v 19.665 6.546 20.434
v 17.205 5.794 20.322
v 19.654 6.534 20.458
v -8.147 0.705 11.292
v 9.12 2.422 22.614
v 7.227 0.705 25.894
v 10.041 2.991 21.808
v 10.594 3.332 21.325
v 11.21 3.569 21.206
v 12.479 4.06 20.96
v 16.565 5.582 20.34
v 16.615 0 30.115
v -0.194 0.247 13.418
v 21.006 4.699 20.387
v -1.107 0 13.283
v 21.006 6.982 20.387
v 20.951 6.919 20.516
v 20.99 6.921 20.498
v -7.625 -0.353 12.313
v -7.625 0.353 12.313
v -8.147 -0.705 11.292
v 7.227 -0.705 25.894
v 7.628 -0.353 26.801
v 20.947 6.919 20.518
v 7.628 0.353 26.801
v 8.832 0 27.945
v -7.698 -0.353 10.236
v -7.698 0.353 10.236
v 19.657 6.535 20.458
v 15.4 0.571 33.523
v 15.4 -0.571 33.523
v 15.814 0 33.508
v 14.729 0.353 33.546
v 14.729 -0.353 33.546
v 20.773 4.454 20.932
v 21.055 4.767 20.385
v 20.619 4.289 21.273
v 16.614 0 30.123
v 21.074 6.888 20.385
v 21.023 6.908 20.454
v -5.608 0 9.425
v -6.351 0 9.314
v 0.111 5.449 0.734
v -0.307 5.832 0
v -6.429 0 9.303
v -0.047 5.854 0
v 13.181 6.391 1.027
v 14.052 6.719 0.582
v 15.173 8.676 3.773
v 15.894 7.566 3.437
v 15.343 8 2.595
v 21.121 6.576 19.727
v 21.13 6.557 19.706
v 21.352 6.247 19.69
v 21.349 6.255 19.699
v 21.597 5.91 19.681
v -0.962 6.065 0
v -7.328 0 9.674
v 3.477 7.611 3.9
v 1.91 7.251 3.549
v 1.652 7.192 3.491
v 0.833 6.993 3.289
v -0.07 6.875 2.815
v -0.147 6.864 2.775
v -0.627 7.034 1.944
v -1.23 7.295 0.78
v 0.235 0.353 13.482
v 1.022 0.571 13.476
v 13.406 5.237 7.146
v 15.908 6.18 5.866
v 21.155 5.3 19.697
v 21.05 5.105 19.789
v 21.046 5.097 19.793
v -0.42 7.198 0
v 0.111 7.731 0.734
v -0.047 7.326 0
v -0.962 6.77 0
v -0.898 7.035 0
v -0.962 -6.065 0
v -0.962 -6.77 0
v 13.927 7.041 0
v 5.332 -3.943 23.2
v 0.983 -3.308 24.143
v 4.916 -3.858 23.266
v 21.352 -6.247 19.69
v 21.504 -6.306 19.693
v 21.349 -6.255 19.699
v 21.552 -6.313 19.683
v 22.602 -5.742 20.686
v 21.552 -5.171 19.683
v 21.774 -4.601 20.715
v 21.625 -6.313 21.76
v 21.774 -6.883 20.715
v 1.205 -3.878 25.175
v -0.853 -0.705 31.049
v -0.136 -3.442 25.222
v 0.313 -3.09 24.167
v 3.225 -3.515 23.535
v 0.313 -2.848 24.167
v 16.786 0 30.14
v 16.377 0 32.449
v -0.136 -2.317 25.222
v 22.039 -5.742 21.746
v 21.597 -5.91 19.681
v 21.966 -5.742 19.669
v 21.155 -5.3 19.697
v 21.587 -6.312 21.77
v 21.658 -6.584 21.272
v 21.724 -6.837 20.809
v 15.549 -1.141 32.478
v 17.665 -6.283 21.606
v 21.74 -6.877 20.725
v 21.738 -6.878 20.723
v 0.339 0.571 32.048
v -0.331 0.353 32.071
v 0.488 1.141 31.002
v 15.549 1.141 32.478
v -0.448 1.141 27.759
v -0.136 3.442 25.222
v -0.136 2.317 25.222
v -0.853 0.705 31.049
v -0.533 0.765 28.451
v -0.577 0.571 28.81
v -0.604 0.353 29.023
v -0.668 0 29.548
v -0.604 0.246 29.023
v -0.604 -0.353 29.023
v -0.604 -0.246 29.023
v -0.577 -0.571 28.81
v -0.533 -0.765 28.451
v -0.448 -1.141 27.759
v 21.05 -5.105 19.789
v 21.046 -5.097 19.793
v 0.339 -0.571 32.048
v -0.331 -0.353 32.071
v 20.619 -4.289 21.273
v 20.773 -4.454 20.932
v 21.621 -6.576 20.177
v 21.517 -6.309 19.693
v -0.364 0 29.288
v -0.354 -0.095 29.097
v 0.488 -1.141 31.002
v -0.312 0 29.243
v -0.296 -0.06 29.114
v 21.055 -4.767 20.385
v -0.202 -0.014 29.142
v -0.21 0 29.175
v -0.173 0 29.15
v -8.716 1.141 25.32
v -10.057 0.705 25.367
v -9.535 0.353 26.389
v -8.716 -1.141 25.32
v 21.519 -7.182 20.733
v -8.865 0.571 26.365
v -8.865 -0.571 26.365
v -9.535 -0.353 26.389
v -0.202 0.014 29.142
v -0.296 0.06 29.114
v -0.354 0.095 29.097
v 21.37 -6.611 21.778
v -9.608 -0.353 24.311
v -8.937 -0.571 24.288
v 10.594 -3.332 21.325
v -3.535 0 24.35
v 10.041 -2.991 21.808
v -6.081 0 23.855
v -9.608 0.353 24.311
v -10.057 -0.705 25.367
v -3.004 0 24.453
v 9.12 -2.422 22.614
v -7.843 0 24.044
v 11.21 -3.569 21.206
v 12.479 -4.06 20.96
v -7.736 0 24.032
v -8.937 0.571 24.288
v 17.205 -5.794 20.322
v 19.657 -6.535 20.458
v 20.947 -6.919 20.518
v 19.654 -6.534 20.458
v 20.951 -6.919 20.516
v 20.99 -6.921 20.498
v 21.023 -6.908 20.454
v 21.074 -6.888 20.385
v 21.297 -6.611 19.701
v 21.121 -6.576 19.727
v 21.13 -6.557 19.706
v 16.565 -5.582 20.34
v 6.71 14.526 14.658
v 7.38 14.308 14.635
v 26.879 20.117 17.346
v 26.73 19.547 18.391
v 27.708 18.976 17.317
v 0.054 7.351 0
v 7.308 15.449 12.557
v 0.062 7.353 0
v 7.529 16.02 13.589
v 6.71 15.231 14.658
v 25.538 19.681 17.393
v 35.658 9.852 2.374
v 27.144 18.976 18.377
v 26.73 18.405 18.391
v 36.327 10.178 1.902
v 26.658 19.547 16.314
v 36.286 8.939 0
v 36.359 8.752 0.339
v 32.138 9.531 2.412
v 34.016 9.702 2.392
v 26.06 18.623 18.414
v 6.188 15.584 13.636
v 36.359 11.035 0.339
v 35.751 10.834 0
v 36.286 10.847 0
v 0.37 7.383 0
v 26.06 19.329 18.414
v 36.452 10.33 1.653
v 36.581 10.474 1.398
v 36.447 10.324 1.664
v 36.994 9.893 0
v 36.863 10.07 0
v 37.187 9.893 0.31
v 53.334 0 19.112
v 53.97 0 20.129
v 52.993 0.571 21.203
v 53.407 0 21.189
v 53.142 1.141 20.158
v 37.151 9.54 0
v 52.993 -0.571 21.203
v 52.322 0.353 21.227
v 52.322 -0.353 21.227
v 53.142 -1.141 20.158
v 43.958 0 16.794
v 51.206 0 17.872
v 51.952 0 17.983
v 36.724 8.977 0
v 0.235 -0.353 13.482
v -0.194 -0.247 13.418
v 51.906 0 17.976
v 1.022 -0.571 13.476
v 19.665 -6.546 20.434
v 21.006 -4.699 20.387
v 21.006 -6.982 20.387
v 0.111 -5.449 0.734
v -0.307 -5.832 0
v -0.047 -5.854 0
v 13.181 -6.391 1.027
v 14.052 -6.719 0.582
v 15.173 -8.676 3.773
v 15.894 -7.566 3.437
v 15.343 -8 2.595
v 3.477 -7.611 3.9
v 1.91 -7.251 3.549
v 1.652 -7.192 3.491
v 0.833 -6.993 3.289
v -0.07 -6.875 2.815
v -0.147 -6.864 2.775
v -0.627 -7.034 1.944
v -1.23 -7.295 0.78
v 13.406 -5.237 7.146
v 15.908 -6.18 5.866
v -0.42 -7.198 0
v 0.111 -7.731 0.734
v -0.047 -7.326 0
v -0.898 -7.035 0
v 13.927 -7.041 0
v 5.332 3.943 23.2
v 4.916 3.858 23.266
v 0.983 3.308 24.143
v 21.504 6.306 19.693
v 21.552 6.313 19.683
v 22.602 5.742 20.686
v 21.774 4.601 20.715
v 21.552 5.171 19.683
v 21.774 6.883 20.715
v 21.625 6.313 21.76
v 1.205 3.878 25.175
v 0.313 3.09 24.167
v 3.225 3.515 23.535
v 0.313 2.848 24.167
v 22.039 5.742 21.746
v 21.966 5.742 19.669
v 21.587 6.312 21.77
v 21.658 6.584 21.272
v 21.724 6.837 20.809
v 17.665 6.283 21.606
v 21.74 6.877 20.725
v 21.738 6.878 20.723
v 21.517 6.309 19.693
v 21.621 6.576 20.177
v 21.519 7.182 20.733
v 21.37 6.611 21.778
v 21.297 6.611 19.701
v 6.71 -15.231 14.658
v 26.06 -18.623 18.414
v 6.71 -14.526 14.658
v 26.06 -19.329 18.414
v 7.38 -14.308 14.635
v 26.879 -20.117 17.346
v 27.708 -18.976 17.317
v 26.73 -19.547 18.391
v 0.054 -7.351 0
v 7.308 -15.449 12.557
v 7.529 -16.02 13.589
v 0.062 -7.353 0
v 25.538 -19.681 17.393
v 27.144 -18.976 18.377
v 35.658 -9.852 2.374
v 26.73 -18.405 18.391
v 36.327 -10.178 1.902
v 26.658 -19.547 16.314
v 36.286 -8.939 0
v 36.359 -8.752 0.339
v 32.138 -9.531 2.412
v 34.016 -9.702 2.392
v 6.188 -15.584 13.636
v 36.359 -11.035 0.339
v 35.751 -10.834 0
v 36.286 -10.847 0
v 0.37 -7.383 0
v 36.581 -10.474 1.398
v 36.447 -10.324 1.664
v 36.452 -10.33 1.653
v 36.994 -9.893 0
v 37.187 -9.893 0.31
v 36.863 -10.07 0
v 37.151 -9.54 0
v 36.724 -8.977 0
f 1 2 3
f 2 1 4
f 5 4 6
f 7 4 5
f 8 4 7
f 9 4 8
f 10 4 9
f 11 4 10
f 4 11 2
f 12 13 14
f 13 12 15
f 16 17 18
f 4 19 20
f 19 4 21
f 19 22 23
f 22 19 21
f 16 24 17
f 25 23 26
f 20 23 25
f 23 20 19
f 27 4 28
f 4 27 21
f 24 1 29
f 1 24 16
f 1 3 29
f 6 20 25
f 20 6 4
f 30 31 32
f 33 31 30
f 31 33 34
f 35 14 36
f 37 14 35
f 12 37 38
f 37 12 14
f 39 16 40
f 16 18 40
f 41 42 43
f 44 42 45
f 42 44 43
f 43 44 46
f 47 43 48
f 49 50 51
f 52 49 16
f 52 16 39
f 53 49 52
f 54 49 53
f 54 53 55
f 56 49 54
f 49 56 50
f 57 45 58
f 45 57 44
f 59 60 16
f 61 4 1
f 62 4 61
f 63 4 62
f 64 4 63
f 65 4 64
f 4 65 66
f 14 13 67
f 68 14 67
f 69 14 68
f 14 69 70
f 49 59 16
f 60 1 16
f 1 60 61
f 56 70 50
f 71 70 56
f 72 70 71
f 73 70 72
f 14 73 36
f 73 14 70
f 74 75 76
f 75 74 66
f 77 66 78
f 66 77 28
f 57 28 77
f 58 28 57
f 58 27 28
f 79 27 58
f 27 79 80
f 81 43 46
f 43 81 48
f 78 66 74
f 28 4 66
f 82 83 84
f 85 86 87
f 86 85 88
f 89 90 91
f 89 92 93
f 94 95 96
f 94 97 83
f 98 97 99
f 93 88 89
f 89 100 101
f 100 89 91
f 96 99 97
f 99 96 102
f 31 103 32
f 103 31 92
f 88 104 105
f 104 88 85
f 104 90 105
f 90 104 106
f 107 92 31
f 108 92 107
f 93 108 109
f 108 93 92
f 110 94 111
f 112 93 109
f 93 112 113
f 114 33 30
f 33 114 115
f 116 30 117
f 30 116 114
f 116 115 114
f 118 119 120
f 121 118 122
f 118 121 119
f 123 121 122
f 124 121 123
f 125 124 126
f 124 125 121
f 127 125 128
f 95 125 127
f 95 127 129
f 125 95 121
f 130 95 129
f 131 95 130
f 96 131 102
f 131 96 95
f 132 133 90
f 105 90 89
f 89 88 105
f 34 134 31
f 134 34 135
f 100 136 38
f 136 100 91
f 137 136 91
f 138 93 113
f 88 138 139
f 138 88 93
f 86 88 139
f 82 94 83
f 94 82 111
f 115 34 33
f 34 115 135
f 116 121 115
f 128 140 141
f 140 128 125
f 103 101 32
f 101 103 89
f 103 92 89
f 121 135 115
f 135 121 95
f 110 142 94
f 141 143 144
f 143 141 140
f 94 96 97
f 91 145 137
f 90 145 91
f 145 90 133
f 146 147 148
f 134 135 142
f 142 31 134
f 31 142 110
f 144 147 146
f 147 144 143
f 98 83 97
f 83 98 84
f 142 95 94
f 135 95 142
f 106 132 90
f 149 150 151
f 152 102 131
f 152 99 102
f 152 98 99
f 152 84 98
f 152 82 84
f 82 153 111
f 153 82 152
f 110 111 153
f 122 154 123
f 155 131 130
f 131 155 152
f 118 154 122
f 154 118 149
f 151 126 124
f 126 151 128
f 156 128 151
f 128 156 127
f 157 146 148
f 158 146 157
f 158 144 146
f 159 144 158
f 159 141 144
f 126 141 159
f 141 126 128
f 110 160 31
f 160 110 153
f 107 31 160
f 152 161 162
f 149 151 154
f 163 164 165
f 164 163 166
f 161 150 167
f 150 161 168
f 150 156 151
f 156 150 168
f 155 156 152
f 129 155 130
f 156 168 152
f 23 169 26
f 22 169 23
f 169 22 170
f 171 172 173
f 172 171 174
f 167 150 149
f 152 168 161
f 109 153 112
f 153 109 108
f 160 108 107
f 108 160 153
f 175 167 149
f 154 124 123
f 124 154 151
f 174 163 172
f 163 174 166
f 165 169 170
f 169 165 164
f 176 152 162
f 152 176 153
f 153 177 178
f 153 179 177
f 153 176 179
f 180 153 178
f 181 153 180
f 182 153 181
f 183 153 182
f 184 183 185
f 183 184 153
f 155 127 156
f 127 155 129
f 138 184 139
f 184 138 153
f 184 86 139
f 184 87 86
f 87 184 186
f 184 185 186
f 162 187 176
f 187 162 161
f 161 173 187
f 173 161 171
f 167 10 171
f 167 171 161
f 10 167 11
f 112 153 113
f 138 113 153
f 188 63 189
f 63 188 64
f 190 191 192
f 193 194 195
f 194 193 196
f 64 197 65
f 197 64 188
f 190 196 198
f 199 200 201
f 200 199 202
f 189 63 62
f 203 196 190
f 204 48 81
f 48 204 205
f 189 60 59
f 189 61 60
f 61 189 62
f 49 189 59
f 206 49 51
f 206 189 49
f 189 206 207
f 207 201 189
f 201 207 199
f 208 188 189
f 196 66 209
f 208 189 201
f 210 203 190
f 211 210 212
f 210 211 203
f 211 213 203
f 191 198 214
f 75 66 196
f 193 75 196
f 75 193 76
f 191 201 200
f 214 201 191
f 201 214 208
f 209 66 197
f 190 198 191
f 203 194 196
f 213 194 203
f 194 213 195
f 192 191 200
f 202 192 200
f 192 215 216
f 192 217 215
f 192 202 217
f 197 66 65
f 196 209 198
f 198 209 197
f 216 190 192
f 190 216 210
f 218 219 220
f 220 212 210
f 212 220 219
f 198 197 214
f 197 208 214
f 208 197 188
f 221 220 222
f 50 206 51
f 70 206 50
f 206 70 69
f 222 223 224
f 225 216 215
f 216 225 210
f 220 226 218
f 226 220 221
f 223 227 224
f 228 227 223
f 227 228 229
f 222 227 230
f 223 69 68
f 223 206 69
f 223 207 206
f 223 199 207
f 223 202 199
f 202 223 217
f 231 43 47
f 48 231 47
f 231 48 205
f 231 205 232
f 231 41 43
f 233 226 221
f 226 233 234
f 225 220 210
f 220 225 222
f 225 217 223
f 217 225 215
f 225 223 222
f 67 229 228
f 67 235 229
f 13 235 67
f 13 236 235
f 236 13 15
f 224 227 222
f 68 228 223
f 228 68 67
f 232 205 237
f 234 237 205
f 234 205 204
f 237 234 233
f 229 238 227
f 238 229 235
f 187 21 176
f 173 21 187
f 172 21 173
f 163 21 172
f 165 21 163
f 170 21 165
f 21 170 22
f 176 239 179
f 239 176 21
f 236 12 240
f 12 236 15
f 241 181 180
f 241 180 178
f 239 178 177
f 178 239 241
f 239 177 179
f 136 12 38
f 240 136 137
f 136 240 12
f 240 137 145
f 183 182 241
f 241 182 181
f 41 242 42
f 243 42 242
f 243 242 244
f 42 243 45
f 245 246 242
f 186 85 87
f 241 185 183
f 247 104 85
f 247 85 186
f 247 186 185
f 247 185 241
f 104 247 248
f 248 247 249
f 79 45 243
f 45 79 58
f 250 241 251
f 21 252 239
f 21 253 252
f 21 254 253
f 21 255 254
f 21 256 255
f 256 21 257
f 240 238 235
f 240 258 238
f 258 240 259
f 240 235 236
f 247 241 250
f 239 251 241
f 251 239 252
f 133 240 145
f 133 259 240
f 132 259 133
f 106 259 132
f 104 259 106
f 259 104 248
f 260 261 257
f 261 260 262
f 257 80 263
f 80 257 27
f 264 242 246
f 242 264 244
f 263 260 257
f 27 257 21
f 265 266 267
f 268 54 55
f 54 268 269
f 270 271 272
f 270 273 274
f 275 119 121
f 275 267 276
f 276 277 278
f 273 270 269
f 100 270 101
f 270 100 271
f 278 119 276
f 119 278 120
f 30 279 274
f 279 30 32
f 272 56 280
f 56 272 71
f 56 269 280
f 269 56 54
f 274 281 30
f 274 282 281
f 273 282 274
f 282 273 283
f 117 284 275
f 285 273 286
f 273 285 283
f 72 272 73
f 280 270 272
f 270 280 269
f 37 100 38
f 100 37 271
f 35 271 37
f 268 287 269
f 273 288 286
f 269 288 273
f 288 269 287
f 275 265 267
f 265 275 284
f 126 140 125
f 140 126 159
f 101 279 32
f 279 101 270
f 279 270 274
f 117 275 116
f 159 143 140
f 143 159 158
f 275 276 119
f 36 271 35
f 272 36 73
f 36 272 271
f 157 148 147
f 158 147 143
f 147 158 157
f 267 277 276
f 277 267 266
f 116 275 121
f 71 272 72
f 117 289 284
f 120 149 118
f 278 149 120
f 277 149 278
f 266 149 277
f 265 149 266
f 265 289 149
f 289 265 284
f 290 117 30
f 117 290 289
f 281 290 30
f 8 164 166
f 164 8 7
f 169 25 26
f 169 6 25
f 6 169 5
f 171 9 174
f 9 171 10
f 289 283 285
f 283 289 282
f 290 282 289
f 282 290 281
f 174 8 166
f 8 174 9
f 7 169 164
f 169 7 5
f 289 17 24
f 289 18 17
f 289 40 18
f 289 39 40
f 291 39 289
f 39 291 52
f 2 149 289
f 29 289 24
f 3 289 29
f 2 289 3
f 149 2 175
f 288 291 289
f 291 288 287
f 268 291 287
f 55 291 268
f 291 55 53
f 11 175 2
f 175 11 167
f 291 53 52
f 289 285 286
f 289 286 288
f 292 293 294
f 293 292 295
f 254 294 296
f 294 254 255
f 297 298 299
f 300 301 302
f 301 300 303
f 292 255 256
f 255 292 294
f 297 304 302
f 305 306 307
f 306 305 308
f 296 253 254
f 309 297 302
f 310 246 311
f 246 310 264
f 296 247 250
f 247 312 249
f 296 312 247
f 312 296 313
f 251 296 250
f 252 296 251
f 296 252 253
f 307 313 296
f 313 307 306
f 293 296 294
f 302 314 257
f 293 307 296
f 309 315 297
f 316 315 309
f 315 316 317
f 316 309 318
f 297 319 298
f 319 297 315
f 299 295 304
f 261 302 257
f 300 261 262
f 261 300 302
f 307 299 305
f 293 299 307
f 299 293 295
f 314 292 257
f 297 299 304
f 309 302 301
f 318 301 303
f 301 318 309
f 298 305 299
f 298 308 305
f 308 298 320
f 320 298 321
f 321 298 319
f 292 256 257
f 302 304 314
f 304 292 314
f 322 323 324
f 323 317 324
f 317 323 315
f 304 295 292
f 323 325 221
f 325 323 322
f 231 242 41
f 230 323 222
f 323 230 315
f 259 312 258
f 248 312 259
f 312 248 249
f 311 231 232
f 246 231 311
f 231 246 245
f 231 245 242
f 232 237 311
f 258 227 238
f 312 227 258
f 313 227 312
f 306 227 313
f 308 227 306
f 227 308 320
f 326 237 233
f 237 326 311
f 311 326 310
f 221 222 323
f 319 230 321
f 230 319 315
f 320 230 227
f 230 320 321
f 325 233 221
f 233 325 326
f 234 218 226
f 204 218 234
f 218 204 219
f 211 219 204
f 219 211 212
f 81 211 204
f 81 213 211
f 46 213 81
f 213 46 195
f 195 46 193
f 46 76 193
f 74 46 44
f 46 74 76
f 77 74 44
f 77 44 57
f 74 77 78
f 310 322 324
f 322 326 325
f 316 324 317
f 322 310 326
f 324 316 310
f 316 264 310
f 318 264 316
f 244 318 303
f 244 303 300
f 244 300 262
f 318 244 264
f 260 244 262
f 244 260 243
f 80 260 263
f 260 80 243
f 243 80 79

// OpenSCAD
/*
   Origami Duck
   kit wallace

*/
//thickness of 'paper'
thickness=1.2;

body_angle=30;
wing_angle=60;
head_angle=25;

//quality of curves
steps=5;
scale=2;

//  functions for creating the matrices for transforming a single point

function m_translate(v) = [ [1, 0, 0, 0],
                            [0, 1, 0, 0],
                            [0, 0, 1, 0],
                            [v.x, v.y, v.z, 1  ] ];

function m_scale(v) =    [ [v.x, 0, 0, 0],
                            [0, v.y, 0, 0],
                            [0, 0, v.z, 0],
                            [0, 0, 0, 1  ] ];
                            
                            
function m_rotate(v) =  [ [1,  0,         0,        0],
                          [0,  cos(v.x),  sin(v.x), 0],
                          [0, -sin(v.x),  cos(v.x), 0],
                          [0,  0,         0,        1] ]
                      * [ [ cos(v.y), 0,  -sin(v.y), 0],
                          [0,         1,  0,        0],
                          [ sin(v.y), 0,  cos(v.y), 0],
                          [0,         0,  0,        1] ]
                      * [ [ cos(v.z),  sin(v.z), 0, 0],
                          [-sin(v.z),  cos(v.z), 0, 0],
                          [ 0,         0,        1, 0],
                          [ 0,         0,        0, 1] ];
                            
function m_to(centre,normal) = 
      m_rotate([0, atan2(sqrt(pow(normal.x, 2) + pow(normal.y, 2)), normal.z), 0]) 
    * m_rotate([0, 0, atan2(normal.y, normal.x)]) 
    * m_translate(centre);   
   
function m_from(centre,normal) = 
      m_translate(-centre)
    * m_rotate([0, 0, -atan2(normal.y, normal.x)]) 
    * m_rotate([0, -atan2(sqrt(pow(normal.x, 2) + pow(normal.y, 2)), normal.z), 0]); 

function m_rotate_about_line(a,v1,v2) =
      m_from(v1,v2-v1)*m_rotate([0,0,a])*m_to(v1,v2-v1);

function vec3(v) = [v.x, v.y, v.z];
function m_transform(v, m)  = vec3([v.x, v.y, v.z, 1] * m);
 
function face_transform(face,m) =
     [ for (v = face) m_transform(v,m) ];
            
module double(axis) { 
      union() {
          children();
          mirror(axis) children();
      }
  }
module face(s,t=thickness) {
    hull()
    for (i=[0:len(s) -1])
       translate(s[i]) sphere(t/2);     
    } 

module ground(size=50) {
   translate([0,0,-size]) cube(2*size,center=true);
}

  
// vertices
p1=[0,0,0];
p2=[4,0,7.5];
p3=[13.8,0,9.8];
p4=[18.2,0,0];
p5=[26,0,11.5];
p6=[7,0,17];
p7=[10.4,0,10.6];
p8=[7,0,0];
p9=[-5,0,13];
p10=[0,0,12.8];
p11=[-0.5,0,16];
p12=[-3.8,0,6];

$fn=steps;
// faces
body =[p12,p5,p1,p4];
wing=[p1,p2,p3,p4];
neck=[p1,p12,p6,p7,p8];
head=[p7,p6,p11,p10];
beak=[p9,p6,p7];

mbody= m_rotate_about_line(body_angle,p12,p5);
rbody= face_transform(body,mbody);
rwing=face_transform(wing,mbody) ; 
mwing = m_rotate_about_line(-wing_angle,rwing[0],rwing[3]);
rrwing = face_transform(rwing,mwing);

mneck = m_rotate_about_line(head_angle,p12,p6);
rp7= m_transform(p7,mneck);  // has to have a kink

mhead = m_rotate_about_line(head_angle,p6,p11);
rhead=face_transform(head,mhead);
mbeak = m_rotate_about_line(head_angle,p6,p9);
rbeak=face_transform(beak,mbeak);

scale(scale)
difference() {
translate([0,0,-0.5])  // to form a better base
rotate([0,2,0])   // in attempt to get it level - gludgy
  double([0,1,0]) {
    color("blue")
        face(rrwing);

    color("green") 
        face(rbody); 

    color("yellow") {
        face([p12,rp7,p6]);
        face([m_transform(p1,mbody),rp7,p12,m_transform(p8,mbody)]);
    }
    color("red") {
       face(rhead);
       face(rbeak);
   }
  }
  ground();  // clip the base
}
